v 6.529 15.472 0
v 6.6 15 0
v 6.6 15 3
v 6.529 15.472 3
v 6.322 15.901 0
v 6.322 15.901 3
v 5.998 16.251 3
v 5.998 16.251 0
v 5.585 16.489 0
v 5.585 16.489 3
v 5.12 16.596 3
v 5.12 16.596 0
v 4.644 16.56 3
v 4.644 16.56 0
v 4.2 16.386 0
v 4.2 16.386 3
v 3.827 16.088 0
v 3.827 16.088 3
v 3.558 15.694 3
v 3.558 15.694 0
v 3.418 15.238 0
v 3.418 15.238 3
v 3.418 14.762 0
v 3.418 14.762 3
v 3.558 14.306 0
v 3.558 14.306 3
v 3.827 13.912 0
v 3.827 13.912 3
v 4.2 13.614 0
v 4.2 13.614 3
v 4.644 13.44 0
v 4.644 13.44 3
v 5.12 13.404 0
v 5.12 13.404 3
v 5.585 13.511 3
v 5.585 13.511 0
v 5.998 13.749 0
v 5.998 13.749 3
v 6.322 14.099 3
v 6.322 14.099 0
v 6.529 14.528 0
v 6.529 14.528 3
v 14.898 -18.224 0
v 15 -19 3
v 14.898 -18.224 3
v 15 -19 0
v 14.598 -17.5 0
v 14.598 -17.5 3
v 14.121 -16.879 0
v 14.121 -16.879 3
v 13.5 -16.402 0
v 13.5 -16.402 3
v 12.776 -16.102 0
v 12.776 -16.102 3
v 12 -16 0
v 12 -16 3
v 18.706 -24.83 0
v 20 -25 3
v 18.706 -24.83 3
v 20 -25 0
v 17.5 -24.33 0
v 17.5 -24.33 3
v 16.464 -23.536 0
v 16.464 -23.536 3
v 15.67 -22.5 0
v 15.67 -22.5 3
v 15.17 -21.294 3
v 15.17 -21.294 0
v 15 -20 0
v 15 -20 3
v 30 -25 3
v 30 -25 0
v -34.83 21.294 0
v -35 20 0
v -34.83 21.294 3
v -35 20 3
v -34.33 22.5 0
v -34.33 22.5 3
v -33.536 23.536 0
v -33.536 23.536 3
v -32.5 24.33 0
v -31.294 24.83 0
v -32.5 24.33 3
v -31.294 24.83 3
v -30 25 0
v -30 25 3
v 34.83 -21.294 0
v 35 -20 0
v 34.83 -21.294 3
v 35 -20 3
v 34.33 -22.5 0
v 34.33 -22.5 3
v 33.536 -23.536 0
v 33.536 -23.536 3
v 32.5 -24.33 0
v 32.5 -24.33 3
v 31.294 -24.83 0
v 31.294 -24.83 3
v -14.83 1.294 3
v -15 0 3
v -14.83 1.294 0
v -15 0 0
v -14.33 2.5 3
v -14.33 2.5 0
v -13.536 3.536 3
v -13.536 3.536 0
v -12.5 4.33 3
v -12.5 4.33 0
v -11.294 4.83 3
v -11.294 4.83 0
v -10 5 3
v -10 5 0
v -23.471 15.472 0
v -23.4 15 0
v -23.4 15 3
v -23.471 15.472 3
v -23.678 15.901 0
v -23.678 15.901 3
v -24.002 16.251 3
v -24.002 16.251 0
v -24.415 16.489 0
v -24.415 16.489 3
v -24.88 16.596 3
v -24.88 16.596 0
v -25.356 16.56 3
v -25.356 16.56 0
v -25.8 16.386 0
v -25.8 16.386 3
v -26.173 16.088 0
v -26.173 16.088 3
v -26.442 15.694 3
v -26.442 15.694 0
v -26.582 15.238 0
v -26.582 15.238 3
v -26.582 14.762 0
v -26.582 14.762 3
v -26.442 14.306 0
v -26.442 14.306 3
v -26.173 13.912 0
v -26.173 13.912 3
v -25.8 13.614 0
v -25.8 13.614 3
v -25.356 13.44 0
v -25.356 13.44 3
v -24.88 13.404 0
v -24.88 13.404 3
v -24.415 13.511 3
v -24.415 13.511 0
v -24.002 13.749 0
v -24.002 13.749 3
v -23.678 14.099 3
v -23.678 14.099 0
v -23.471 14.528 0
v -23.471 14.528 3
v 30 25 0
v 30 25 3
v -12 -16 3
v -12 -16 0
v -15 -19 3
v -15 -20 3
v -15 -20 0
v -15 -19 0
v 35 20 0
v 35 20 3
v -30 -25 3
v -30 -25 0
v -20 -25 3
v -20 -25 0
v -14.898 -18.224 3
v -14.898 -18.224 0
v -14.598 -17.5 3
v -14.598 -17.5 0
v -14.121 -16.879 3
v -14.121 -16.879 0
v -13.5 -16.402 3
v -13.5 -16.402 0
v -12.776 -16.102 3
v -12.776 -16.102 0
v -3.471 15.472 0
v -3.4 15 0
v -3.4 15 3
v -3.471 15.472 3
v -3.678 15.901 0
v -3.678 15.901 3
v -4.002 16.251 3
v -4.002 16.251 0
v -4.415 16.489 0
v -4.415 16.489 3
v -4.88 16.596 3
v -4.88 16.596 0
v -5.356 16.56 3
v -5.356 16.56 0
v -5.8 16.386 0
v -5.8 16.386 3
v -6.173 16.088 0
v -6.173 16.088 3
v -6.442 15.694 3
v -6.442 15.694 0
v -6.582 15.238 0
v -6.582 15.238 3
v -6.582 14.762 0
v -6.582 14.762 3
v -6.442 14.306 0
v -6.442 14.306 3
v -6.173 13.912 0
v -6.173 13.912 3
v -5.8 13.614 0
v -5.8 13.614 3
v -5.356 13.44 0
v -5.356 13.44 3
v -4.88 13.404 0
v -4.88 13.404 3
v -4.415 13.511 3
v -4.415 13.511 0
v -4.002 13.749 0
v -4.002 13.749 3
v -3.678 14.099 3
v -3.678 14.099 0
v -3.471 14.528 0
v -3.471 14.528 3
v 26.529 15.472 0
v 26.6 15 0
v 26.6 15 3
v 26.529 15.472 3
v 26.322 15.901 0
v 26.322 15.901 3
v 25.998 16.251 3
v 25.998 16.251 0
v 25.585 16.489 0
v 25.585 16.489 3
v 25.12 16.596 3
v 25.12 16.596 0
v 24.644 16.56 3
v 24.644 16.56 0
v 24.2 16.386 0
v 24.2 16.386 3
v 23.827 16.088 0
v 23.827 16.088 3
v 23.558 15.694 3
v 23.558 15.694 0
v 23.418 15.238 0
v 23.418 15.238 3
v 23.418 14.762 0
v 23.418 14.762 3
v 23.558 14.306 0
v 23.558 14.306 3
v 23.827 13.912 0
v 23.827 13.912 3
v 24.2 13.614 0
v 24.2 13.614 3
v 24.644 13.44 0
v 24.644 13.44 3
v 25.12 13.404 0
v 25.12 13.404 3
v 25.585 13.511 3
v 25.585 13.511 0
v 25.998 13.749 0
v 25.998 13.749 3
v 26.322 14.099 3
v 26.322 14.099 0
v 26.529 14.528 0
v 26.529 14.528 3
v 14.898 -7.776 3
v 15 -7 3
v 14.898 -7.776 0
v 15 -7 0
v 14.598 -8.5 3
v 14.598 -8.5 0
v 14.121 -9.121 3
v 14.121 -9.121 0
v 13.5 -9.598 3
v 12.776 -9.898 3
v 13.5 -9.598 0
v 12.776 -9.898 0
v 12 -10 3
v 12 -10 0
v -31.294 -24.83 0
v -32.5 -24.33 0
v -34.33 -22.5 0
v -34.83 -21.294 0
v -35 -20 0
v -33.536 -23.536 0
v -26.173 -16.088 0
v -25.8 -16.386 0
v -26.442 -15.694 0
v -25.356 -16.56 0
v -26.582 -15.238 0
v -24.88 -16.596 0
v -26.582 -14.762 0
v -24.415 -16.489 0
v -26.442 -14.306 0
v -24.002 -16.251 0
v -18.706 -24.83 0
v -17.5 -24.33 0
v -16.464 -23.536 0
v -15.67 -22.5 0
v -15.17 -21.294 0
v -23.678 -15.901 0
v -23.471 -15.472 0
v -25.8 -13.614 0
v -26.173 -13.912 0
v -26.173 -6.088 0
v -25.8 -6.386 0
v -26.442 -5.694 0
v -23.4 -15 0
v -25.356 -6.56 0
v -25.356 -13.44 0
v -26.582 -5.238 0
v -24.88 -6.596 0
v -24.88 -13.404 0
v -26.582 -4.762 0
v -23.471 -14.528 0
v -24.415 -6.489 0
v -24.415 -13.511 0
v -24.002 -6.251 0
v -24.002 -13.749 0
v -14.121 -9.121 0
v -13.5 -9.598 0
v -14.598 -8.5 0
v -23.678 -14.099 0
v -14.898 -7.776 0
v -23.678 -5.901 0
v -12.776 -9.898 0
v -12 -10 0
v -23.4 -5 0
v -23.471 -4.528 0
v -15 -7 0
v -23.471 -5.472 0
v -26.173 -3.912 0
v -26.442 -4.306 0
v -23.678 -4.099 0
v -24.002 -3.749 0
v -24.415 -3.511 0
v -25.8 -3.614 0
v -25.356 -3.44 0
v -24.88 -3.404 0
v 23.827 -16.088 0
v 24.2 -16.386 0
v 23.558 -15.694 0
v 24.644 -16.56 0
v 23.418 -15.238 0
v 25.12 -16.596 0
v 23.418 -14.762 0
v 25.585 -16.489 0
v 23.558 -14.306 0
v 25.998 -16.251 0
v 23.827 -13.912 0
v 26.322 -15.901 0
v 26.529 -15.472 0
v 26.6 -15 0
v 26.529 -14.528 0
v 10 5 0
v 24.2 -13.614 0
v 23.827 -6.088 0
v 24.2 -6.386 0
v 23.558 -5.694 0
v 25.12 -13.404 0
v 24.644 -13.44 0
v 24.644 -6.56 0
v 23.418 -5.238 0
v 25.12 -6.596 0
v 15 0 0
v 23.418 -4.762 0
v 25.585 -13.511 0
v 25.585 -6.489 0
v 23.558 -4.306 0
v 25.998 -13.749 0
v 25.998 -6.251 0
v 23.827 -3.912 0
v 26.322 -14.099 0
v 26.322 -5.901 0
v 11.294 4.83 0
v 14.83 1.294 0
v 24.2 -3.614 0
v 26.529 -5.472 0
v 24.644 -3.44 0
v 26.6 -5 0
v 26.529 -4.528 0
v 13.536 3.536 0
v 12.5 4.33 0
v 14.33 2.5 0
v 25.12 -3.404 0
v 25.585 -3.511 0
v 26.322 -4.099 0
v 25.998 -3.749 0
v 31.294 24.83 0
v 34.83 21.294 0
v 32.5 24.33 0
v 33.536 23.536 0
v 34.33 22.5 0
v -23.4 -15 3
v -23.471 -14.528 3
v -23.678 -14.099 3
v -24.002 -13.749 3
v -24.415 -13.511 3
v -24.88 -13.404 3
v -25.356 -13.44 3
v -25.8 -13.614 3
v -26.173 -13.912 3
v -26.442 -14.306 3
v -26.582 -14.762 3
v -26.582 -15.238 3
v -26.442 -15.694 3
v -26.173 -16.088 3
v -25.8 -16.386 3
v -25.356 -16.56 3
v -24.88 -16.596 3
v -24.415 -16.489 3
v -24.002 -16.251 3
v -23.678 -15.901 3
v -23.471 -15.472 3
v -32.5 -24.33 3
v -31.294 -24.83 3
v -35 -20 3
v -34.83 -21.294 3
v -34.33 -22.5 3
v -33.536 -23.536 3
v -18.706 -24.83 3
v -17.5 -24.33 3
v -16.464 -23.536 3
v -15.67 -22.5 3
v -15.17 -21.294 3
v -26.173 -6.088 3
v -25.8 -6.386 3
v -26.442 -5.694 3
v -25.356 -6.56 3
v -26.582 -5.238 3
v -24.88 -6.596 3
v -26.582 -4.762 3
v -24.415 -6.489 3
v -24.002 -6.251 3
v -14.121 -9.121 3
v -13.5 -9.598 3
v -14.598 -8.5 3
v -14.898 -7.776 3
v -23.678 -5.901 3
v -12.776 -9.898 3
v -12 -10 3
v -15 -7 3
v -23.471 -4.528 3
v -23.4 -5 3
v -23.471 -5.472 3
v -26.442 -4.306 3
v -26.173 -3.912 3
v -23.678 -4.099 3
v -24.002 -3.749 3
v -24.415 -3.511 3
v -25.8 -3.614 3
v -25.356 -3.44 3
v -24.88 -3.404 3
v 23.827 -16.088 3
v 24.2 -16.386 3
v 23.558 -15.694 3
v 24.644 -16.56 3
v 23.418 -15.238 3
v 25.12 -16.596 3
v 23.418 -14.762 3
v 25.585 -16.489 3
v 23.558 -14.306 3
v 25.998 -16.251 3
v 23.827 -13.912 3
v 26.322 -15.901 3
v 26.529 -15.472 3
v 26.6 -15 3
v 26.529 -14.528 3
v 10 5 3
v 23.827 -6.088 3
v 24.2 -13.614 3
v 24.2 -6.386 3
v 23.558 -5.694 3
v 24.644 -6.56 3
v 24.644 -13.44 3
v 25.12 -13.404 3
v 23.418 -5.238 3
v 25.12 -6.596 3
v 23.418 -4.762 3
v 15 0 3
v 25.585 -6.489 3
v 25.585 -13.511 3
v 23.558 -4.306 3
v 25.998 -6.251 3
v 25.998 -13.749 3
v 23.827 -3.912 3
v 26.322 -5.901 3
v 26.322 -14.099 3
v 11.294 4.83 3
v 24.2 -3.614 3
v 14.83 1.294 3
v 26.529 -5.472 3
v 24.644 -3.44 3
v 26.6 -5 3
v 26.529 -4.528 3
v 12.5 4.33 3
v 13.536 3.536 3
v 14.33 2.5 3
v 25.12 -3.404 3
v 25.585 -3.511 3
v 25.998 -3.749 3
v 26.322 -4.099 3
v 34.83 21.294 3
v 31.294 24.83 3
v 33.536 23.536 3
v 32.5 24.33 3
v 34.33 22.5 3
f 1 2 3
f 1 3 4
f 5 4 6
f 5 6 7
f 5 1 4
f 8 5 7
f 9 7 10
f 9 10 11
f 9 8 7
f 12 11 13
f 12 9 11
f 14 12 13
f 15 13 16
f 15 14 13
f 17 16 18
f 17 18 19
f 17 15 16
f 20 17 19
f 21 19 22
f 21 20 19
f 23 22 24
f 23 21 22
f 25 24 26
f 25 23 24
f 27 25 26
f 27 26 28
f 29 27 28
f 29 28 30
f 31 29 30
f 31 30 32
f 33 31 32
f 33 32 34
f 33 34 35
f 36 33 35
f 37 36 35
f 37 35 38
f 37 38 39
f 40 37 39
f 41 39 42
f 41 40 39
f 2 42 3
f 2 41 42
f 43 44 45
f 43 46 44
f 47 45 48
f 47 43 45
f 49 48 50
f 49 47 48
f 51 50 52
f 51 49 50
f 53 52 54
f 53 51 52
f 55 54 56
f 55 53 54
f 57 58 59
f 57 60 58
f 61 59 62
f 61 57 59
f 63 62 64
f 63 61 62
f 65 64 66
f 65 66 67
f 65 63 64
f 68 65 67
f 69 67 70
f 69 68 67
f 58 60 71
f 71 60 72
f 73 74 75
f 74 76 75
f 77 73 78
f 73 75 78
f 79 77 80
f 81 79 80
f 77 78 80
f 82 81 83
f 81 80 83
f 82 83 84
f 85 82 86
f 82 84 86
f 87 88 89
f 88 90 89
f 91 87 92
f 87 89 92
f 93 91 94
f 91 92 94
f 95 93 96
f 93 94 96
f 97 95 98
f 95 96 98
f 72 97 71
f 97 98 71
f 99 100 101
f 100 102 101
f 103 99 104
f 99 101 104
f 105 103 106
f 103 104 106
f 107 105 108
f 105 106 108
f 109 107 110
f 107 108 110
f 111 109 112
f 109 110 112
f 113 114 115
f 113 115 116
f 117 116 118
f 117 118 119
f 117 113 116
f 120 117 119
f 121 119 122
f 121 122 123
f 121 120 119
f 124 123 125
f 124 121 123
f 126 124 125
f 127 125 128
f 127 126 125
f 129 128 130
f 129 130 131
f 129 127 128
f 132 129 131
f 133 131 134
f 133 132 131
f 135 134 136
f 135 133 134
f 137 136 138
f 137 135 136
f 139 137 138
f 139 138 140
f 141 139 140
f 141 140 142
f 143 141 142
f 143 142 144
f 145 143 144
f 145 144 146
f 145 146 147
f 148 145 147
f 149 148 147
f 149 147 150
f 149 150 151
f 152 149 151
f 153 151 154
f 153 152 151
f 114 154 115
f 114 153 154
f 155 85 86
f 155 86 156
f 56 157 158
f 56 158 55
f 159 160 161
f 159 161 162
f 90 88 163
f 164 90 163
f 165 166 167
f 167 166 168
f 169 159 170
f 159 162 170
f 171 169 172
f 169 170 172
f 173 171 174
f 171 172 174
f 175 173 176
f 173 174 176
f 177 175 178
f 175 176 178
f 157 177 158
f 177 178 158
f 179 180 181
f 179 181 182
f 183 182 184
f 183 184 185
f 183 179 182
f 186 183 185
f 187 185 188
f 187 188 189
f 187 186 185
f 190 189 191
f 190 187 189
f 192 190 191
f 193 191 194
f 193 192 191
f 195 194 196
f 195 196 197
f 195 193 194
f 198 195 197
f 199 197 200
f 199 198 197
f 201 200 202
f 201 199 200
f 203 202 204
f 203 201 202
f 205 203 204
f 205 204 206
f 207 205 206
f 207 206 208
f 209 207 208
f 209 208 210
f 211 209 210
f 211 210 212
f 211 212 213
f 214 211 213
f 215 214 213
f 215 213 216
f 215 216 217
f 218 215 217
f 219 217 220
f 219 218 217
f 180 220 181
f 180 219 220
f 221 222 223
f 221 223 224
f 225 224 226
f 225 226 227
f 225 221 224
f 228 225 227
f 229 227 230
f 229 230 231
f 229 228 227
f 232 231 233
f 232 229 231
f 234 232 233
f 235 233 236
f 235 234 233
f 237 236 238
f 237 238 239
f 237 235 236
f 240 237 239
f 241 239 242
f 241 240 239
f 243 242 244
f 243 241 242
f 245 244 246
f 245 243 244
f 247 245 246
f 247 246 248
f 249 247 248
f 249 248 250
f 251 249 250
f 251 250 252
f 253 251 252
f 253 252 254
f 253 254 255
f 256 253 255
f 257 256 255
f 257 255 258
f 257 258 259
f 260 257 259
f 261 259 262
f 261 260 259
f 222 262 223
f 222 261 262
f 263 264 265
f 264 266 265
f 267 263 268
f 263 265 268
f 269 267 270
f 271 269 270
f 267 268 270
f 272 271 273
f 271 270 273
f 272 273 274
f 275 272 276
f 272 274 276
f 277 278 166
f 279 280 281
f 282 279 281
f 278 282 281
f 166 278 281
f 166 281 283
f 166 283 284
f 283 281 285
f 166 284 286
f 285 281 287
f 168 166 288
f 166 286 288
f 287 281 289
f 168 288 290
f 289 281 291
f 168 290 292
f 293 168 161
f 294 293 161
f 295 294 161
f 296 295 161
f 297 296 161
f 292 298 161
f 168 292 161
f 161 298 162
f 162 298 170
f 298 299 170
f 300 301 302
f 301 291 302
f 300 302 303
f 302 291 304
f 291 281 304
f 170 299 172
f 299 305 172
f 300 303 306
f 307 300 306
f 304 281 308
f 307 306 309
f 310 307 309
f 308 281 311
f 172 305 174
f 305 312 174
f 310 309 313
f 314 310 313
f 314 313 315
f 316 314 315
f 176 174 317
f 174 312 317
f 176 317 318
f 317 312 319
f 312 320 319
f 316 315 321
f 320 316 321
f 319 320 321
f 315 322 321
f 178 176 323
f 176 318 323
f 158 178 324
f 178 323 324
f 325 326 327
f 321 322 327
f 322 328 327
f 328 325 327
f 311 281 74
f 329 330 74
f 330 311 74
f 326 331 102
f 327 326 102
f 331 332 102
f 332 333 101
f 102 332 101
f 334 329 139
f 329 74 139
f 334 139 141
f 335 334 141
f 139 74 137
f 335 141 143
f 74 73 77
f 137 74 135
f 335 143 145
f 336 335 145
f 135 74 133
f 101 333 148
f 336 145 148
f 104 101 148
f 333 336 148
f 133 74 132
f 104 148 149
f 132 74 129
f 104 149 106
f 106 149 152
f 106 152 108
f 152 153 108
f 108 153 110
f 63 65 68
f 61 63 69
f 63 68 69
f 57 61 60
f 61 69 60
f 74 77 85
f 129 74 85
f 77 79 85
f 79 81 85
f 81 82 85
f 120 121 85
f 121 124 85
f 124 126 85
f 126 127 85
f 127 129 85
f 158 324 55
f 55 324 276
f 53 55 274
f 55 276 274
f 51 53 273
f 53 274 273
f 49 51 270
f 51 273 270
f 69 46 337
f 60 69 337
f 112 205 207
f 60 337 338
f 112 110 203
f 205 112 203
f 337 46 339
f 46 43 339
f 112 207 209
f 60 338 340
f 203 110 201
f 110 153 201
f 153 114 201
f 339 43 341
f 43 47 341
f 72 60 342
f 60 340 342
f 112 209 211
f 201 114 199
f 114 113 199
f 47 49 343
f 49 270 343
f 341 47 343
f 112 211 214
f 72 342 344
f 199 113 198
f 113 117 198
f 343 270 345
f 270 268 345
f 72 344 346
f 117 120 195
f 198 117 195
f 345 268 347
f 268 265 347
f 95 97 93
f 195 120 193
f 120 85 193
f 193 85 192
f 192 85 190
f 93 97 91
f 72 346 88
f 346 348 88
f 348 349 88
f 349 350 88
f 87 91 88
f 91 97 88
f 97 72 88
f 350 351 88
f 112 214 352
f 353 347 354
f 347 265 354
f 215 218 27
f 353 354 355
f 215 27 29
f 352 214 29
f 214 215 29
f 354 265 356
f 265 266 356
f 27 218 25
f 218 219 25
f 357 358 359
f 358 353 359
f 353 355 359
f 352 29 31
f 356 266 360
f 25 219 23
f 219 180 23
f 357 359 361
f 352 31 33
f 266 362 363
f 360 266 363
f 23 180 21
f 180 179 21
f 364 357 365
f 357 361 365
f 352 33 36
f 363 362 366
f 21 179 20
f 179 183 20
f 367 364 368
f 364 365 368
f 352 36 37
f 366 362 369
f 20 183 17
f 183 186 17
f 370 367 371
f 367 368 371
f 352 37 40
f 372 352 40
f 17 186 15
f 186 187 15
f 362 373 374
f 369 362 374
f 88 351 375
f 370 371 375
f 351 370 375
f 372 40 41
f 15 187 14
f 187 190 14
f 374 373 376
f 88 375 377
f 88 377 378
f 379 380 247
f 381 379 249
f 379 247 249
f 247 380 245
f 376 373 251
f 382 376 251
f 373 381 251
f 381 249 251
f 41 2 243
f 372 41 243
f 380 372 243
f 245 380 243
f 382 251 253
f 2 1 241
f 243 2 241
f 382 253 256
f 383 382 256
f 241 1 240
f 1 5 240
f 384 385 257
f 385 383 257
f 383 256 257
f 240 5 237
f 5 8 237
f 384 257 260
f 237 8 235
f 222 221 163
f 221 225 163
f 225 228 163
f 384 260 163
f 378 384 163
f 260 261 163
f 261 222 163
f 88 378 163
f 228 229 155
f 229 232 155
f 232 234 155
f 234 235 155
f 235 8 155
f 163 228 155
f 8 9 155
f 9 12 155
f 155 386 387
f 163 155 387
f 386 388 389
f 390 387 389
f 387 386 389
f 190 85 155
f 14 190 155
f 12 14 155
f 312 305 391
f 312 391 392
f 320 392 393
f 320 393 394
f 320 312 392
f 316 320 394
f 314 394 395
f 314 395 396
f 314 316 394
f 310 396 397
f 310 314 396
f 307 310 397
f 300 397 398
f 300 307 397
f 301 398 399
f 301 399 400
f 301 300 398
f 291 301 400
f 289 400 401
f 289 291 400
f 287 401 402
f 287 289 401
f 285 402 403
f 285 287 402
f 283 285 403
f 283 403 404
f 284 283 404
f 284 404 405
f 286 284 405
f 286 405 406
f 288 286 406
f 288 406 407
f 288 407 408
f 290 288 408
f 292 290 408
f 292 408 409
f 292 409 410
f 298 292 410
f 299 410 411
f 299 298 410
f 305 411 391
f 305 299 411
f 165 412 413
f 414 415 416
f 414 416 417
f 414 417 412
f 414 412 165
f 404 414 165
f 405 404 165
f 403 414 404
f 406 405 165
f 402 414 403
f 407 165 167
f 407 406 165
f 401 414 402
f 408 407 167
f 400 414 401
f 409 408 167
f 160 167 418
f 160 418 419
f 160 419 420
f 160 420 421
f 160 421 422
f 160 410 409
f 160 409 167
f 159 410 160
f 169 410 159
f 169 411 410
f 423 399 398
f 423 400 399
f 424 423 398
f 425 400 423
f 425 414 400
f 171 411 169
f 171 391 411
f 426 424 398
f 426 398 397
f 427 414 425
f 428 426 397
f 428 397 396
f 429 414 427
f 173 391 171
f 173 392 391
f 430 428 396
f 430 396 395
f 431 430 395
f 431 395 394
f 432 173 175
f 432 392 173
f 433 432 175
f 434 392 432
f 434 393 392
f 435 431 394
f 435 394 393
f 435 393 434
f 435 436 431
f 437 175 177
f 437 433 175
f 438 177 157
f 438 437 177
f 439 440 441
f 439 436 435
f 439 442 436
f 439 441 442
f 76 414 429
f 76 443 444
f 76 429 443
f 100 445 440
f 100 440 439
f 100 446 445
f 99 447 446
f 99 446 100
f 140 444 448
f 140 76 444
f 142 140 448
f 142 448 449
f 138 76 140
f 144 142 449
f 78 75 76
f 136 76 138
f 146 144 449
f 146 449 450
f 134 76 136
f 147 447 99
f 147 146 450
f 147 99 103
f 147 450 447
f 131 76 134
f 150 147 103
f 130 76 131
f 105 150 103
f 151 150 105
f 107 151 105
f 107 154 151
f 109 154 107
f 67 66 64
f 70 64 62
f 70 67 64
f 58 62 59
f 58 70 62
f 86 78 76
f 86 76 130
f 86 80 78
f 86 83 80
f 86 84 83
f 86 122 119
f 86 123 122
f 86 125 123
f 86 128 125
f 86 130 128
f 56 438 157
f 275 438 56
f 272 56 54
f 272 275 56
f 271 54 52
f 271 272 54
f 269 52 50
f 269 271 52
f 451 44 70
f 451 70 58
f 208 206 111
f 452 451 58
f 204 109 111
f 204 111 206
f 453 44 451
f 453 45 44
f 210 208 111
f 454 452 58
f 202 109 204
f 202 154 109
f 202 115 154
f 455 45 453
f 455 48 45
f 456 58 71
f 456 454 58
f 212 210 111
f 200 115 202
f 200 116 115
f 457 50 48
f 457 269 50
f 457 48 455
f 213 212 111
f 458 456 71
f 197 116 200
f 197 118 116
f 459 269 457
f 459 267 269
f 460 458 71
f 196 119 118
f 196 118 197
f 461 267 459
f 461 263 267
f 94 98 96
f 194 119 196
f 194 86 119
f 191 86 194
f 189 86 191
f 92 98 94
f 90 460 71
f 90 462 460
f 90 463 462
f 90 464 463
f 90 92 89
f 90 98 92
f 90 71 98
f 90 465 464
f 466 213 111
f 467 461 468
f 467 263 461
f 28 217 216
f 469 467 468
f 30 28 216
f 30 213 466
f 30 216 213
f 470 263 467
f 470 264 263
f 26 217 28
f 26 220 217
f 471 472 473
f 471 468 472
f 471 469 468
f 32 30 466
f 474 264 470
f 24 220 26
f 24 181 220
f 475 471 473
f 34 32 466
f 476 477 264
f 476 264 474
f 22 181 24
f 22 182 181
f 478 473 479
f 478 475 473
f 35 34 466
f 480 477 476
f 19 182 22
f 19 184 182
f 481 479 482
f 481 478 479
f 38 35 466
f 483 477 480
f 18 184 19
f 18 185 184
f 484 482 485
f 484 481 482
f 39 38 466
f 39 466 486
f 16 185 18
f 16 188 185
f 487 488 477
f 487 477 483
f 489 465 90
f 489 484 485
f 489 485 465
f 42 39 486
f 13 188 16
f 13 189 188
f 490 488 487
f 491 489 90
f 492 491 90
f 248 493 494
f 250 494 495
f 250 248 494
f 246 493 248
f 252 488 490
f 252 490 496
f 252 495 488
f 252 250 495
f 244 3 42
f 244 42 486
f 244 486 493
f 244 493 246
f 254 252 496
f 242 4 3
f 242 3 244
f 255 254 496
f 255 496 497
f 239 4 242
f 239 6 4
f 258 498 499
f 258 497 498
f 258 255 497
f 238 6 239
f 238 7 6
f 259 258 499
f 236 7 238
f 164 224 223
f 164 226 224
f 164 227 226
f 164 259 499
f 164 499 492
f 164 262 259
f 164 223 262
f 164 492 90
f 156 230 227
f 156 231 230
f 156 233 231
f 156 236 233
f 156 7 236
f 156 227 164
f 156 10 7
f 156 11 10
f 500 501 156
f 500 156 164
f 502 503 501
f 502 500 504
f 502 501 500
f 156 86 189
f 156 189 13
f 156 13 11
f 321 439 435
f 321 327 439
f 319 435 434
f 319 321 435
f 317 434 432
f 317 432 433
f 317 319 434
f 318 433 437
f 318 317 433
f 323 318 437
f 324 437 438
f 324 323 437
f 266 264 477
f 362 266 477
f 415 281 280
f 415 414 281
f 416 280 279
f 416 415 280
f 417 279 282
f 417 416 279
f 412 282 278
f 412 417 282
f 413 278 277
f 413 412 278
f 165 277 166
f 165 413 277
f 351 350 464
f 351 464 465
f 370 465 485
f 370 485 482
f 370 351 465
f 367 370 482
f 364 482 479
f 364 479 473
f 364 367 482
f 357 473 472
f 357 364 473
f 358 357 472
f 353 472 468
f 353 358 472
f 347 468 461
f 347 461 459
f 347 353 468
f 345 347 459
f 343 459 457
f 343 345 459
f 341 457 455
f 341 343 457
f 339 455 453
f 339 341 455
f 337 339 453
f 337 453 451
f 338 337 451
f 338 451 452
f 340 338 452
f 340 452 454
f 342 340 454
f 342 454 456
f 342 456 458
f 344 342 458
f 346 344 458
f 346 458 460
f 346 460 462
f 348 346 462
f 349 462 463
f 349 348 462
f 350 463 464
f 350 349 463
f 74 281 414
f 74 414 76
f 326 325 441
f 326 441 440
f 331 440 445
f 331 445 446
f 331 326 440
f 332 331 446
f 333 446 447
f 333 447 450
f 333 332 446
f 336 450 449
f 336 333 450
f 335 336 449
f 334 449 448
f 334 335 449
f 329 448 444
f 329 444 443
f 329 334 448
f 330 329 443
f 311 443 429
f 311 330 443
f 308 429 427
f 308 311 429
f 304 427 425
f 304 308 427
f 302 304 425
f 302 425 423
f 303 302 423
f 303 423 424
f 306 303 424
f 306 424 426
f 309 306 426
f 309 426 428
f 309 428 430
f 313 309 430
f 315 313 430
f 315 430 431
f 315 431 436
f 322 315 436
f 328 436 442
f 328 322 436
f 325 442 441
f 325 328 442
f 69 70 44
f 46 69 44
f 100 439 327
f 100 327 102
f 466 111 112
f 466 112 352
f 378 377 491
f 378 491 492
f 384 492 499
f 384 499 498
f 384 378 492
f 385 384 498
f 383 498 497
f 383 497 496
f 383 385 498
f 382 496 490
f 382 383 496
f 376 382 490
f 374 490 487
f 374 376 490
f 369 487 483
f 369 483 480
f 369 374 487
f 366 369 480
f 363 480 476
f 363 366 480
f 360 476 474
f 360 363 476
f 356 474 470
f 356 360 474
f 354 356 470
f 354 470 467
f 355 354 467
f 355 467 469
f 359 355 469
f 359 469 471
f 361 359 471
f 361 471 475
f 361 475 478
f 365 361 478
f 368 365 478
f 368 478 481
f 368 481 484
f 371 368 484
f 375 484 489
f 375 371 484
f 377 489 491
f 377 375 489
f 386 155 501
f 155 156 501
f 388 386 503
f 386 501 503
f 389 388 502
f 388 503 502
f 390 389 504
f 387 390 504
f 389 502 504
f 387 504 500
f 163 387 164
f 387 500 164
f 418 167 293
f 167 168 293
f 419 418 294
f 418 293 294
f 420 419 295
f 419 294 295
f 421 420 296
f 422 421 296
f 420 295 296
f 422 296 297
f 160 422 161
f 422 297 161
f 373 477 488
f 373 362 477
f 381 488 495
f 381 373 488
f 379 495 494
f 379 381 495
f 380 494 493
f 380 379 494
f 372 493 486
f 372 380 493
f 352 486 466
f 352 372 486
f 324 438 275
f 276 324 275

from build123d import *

# Parameters (mm, degrees)
SKETCH_1_W          = 70
SKETCH_1_H          = 50
SKETCH_1_R          = 1.6
EXTRUDE_1_DEPTH     = 3
SKETCH_2_W          = 30
SKETCH_2_H          = 30
CUT_EXTRUDE_1_DEPTH = 4
FILLET_1_R          = 5
SKETCH_3_W          = 30
SKETCH_3_H          = 6
EXTRUDE_2_DEPTH     = 3
FILLET_2_R          = 3


with BuildPart() as part:
    # 草图1 → 凸台-拉伸1 (new body)
    with BuildSketch(Plane.XY):
        Rectangle(SKETCH_1_W, SKETCH_1_H)
        with Locations((-25, -15)):
            Circle(SKETCH_1_R, mode=Mode.SUBTRACT)
        with Locations((-25, -5)):
            Circle(SKETCH_1_R, mode=Mode.SUBTRACT)
        with Locations((-25, 15)):
            Circle(SKETCH_1_R, mode=Mode.SUBTRACT)
        with Locations((-5, 15)):
            Circle(SKETCH_1_R, mode=Mode.SUBTRACT)
        with Locations((5, 15)):
            Circle(SKETCH_1_R, mode=Mode.SUBTRACT)
        with Locations((25, 15)):
            Circle(SKETCH_1_R, mode=Mode.SUBTRACT)
        with Locations((25, -5)):
            Circle(SKETCH_1_R, mode=Mode.SUBTRACT)
        with Locations((25, -15)):
            Circle(SKETCH_1_R, mode=Mode.SUBTRACT)
    extrude(amount=EXTRUDE_1_DEPTH)

    # 草图2 → 切除-拉伸1 (cut, through all)
    with BuildSketch(Plane.XY.offset(3)):
        with Locations((0, -10)):
            Rectangle(SKETCH_2_W, SKETCH_2_H)
    extrude(amount=-CUT_EXTRUDE_1_DEPTH, mode=Mode.SUBTRACT)

    # 圆角1
    fillet_1_edges = [part.edges().sort_by_distance(p)[0] for p in [
        (15, -25, 1.5),
        (-15, -25, 1.5),
        (-15, 5, 1.5),
        (15, 5, 1.5),
        (35, -25, 1.5),
        (-35, -25, 1.5),
        (-35, 25, 1.5),
        (35, 25, 1.5),
    ]]
    fillet(fillet_1_edges, radius=FILLET_1_R)

    # 草图3 → 凸台-拉伸2 (add)
    with BuildSketch(Plane.XY.offset(3)):
        with Locations((0, -13)):
            Rectangle(SKETCH_3_W, SKETCH_3_H)
    extrude(amount=-EXTRUDE_2_DEPTH)

    # 圆角2
    fillet_2_edges = [part.edges().sort_by_distance(p)[0] for p in [
        (-15, -16, 1.5),
        (-15, -10, 1.5),
        (15, -10, 1.5),
        (15, -16, 1.5),
    ]]
    fillet(fillet_2_edges, radius=FILLET_2_R)


solid = part.part
